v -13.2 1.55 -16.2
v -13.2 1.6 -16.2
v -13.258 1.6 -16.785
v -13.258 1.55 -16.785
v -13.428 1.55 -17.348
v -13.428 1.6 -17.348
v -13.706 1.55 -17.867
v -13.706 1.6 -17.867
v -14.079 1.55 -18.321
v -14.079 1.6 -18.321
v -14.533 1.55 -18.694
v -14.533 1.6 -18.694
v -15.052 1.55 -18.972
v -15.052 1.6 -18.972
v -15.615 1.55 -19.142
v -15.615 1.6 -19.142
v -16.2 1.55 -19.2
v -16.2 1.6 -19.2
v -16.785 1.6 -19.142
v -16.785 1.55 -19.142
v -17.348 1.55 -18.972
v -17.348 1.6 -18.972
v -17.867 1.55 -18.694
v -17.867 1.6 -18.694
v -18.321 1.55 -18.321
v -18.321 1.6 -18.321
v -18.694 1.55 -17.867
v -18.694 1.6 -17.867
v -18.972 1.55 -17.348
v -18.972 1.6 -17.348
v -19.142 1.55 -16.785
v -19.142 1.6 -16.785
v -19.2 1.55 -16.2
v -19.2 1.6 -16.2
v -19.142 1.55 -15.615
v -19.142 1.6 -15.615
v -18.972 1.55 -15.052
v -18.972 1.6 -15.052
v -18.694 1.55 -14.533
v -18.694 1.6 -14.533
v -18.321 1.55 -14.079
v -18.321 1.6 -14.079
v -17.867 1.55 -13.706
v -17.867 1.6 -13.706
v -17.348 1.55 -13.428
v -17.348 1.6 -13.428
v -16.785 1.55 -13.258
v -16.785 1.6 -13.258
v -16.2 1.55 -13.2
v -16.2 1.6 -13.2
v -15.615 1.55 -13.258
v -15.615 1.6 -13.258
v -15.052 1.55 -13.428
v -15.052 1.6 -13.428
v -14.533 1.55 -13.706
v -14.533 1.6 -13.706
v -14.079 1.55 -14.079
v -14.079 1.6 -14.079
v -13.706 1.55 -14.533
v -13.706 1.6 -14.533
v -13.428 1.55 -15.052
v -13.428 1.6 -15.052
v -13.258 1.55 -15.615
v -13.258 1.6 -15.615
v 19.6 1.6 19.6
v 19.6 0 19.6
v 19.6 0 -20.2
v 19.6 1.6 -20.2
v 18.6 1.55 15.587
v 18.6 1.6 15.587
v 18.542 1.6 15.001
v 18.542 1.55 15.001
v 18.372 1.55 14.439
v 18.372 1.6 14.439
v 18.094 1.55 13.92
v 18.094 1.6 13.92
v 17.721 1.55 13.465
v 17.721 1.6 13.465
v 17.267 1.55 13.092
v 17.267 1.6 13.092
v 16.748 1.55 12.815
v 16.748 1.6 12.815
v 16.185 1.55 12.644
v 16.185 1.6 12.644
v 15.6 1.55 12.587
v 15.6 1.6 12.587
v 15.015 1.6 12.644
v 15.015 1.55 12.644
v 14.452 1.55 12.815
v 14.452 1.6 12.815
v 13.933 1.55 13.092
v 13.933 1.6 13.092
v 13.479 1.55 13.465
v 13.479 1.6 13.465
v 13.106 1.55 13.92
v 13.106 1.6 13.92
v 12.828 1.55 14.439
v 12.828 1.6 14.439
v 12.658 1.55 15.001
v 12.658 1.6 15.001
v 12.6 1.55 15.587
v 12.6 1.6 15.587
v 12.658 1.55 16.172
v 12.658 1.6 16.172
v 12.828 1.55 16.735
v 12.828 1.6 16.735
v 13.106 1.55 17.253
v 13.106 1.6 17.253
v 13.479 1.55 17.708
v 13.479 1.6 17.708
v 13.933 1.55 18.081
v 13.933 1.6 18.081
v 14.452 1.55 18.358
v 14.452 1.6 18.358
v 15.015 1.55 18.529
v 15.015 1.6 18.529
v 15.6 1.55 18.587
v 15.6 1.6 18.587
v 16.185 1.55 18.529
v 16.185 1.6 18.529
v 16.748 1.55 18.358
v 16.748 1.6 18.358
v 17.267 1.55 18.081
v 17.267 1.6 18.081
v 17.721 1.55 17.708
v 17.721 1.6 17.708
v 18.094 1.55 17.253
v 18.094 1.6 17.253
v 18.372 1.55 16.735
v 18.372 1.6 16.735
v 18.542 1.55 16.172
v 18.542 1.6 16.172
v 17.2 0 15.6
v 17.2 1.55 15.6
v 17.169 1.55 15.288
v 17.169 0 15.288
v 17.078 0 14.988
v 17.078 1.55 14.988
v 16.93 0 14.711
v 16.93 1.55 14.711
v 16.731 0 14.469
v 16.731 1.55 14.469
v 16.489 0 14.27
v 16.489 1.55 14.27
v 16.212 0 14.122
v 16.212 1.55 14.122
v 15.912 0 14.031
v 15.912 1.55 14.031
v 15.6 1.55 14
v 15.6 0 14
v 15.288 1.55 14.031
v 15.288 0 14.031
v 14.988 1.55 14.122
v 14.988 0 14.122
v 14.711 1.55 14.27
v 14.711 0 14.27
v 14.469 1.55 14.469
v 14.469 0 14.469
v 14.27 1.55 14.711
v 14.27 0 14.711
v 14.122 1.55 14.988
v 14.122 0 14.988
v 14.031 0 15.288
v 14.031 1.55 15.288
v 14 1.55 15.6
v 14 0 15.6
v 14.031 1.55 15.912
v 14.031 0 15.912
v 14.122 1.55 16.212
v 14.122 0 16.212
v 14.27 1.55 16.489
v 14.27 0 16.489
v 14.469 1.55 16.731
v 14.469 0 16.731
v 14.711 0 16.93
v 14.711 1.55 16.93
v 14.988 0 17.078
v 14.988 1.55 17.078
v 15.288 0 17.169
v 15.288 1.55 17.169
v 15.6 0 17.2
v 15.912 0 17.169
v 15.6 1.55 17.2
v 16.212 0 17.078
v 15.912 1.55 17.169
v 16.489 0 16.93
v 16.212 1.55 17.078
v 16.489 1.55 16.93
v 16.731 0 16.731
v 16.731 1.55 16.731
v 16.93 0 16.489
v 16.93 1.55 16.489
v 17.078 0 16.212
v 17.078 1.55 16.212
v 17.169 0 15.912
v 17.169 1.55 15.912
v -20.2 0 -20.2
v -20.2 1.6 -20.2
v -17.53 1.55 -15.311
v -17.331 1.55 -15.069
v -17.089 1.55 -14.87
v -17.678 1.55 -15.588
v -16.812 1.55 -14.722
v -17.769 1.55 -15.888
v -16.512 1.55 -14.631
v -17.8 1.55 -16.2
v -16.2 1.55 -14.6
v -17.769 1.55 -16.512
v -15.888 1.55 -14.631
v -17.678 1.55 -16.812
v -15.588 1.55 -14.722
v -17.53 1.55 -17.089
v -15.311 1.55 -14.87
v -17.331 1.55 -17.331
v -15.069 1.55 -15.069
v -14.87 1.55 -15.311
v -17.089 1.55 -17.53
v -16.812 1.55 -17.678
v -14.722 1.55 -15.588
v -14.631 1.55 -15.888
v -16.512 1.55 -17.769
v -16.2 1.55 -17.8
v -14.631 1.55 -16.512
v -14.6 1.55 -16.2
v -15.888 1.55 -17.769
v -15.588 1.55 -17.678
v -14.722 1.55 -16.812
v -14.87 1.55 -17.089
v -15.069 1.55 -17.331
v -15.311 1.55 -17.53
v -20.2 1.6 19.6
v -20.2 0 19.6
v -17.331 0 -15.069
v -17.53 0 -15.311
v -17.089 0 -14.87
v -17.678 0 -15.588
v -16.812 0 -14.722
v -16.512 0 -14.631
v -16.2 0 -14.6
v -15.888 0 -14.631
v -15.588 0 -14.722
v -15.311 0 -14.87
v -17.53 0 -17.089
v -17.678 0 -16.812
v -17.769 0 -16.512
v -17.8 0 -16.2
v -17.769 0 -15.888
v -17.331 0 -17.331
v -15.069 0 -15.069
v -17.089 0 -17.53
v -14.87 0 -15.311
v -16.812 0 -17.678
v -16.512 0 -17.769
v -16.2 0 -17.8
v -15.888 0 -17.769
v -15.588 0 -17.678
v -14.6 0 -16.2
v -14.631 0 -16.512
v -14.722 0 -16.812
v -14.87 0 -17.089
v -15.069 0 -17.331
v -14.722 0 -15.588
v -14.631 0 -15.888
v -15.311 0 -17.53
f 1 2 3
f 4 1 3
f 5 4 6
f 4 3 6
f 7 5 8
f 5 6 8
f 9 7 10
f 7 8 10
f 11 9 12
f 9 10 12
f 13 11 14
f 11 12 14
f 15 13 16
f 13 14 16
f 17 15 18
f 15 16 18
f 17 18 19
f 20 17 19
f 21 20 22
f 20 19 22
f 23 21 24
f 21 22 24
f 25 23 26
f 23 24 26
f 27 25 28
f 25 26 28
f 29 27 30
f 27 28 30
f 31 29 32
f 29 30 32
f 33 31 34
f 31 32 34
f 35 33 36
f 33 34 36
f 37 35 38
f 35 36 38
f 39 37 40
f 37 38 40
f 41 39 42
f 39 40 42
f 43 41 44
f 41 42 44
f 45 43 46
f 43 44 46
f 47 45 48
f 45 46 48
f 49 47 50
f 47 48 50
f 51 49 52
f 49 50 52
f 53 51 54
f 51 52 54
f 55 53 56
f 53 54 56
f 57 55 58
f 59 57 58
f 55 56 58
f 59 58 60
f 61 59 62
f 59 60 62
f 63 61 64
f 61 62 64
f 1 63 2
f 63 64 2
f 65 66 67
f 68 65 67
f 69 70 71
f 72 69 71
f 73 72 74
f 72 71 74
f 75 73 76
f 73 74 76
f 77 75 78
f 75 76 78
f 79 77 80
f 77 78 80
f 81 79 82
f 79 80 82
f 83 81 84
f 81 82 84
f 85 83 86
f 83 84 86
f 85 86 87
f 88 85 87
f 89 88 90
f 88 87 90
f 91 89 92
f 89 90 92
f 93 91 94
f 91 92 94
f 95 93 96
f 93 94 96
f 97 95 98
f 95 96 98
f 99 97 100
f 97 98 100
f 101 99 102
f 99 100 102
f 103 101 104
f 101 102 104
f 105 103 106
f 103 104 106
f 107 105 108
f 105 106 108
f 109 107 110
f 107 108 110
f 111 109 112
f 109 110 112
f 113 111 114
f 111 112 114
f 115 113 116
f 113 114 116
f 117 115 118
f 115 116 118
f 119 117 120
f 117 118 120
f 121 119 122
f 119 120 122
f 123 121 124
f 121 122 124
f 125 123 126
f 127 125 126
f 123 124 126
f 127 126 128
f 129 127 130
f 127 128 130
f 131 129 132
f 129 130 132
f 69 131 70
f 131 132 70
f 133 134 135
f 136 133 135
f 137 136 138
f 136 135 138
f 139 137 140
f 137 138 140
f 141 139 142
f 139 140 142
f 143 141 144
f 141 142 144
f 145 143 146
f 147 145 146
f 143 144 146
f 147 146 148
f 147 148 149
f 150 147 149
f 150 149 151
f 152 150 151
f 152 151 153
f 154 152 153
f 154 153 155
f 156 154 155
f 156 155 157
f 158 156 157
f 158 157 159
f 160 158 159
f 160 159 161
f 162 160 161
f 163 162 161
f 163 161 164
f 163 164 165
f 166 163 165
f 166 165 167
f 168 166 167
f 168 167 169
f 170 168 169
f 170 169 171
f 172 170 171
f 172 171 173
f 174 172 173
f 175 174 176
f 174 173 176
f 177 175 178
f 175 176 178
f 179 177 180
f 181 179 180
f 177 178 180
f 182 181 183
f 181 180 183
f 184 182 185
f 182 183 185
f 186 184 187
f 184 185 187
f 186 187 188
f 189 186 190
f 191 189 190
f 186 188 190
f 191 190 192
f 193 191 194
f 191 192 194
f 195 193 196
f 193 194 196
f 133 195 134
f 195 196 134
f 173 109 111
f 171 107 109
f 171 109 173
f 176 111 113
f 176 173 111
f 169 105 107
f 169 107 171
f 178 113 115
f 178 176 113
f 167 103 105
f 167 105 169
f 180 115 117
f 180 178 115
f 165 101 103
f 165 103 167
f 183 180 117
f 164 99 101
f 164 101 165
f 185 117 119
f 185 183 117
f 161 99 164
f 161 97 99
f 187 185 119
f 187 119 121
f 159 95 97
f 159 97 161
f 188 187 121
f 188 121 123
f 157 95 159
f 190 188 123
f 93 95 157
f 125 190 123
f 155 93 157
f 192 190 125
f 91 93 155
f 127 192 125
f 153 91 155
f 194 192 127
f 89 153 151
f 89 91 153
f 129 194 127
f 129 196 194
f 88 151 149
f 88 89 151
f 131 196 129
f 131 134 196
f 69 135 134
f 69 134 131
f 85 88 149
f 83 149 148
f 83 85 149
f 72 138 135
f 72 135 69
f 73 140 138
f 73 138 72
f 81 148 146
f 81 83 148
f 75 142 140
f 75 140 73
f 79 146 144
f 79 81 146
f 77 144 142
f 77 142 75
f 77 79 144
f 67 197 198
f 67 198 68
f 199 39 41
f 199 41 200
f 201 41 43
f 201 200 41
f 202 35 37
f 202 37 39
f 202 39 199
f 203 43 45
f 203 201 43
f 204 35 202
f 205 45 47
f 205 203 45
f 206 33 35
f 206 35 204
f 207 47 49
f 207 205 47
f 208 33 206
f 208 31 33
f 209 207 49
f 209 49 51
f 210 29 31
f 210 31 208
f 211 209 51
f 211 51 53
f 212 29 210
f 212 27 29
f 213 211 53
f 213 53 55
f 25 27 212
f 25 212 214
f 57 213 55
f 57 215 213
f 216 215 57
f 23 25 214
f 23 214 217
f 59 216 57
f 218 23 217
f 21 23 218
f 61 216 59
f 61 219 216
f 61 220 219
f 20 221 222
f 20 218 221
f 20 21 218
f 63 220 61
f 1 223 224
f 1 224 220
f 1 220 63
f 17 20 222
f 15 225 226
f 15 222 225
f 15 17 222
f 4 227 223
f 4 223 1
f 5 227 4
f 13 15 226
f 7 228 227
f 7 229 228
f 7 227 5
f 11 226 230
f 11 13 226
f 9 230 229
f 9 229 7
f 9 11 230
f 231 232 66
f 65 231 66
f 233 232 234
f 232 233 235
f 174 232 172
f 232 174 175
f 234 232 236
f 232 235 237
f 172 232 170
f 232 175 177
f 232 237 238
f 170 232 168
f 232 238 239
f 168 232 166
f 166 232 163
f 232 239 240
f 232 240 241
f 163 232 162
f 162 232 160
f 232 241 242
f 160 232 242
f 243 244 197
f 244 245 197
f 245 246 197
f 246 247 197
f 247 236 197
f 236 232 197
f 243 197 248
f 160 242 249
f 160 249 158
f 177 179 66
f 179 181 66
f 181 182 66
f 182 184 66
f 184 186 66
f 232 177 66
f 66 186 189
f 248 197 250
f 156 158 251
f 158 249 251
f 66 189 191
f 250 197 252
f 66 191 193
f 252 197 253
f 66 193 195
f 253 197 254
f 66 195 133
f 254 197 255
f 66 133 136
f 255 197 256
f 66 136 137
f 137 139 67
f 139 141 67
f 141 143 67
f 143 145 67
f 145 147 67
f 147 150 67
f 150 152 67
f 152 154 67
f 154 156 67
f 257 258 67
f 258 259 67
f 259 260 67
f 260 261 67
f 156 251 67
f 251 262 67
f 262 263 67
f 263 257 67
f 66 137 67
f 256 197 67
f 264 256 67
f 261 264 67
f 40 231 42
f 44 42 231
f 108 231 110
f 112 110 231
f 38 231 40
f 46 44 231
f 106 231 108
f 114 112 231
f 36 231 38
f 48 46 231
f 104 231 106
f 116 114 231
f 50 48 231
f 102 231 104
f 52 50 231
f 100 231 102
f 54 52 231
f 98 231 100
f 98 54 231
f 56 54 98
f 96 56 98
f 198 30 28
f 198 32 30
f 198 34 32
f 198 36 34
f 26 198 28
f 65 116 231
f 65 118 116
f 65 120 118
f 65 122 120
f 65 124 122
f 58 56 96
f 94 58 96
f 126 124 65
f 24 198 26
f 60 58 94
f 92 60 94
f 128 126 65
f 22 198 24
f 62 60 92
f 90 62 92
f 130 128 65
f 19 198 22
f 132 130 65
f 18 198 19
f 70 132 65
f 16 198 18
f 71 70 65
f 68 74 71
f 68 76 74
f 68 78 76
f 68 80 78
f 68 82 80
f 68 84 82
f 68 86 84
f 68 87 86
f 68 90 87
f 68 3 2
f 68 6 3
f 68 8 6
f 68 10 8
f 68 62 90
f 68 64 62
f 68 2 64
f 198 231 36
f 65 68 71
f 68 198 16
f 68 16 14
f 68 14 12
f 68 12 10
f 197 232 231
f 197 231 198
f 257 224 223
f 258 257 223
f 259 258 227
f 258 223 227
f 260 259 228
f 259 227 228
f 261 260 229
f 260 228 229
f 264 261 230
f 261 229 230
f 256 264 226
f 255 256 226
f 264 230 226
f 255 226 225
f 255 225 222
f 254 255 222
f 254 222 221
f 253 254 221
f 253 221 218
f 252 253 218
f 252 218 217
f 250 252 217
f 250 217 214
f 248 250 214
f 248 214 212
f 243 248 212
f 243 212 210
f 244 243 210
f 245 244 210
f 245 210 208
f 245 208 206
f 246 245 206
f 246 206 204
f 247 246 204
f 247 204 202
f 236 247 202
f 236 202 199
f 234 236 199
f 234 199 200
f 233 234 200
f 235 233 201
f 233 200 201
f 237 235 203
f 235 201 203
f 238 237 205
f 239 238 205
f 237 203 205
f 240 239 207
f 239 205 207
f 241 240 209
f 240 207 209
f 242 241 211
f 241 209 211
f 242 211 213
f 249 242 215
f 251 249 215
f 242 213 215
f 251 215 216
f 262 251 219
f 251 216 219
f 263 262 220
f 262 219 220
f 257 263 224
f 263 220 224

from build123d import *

# Parameters (mm, degrees)
SKETCH1_W           = 39.8
SKETCH1_H           = 39.8
BOSS_EXTRUDE1_DEPTH = 1.6
SKETCH10_R          = 3
CUT_EXTRUDE6_DEPTH  = 0.05
SKETCH11_R          = 1.6
CUT_EXTRUDE7_DEPTH  = 1.6


with BuildPart() as part:
    # Sketch1 → Boss-Extrude1 (new body)
    with BuildSketch(Plane(origin=(0, 0, 0), x_dir=(1, 0, 0), z_dir=(0, 1, 0))):
        with Locations((-0.3, 0.3)):
            Rectangle(SKETCH1_W, SKETCH1_H)
    extrude(amount=BOSS_EXTRUDE1_DEPTH)

    # Sketch10 → Cut-Extrude6 (cut)
    with BuildSketch(Plane(origin=(0, 1.6, 0), x_dir=(1, 0, 0), z_dir=(0, 1, 0))):
        with Locations((-16.2, 16.2)):
            Circle(SKETCH10_R)
        with Locations((15.599994551, -15.586708083)):
            Circle(SKETCH10_R)
    extrude(amount=-CUT_EXTRUDE6_DEPTH, mode=Mode.SUBTRACT)

    # Sketch11 → Cut-Extrude7 (cut)
    with BuildSketch(Plane(origin=(0, 1.6, 0), x_dir=(1, 0, 0), z_dir=(0, 1, 0))):
        with Locations((-16.2, 16.2)):
            Circle(SKETCH11_R)
        with Locations((15.6, -15.6)):
            Circle(SKETCH11_R)
    extrude(amount=-CUT_EXTRUDE7_DEPTH, mode=Mode.SUBTRACT)


solid = part.part
